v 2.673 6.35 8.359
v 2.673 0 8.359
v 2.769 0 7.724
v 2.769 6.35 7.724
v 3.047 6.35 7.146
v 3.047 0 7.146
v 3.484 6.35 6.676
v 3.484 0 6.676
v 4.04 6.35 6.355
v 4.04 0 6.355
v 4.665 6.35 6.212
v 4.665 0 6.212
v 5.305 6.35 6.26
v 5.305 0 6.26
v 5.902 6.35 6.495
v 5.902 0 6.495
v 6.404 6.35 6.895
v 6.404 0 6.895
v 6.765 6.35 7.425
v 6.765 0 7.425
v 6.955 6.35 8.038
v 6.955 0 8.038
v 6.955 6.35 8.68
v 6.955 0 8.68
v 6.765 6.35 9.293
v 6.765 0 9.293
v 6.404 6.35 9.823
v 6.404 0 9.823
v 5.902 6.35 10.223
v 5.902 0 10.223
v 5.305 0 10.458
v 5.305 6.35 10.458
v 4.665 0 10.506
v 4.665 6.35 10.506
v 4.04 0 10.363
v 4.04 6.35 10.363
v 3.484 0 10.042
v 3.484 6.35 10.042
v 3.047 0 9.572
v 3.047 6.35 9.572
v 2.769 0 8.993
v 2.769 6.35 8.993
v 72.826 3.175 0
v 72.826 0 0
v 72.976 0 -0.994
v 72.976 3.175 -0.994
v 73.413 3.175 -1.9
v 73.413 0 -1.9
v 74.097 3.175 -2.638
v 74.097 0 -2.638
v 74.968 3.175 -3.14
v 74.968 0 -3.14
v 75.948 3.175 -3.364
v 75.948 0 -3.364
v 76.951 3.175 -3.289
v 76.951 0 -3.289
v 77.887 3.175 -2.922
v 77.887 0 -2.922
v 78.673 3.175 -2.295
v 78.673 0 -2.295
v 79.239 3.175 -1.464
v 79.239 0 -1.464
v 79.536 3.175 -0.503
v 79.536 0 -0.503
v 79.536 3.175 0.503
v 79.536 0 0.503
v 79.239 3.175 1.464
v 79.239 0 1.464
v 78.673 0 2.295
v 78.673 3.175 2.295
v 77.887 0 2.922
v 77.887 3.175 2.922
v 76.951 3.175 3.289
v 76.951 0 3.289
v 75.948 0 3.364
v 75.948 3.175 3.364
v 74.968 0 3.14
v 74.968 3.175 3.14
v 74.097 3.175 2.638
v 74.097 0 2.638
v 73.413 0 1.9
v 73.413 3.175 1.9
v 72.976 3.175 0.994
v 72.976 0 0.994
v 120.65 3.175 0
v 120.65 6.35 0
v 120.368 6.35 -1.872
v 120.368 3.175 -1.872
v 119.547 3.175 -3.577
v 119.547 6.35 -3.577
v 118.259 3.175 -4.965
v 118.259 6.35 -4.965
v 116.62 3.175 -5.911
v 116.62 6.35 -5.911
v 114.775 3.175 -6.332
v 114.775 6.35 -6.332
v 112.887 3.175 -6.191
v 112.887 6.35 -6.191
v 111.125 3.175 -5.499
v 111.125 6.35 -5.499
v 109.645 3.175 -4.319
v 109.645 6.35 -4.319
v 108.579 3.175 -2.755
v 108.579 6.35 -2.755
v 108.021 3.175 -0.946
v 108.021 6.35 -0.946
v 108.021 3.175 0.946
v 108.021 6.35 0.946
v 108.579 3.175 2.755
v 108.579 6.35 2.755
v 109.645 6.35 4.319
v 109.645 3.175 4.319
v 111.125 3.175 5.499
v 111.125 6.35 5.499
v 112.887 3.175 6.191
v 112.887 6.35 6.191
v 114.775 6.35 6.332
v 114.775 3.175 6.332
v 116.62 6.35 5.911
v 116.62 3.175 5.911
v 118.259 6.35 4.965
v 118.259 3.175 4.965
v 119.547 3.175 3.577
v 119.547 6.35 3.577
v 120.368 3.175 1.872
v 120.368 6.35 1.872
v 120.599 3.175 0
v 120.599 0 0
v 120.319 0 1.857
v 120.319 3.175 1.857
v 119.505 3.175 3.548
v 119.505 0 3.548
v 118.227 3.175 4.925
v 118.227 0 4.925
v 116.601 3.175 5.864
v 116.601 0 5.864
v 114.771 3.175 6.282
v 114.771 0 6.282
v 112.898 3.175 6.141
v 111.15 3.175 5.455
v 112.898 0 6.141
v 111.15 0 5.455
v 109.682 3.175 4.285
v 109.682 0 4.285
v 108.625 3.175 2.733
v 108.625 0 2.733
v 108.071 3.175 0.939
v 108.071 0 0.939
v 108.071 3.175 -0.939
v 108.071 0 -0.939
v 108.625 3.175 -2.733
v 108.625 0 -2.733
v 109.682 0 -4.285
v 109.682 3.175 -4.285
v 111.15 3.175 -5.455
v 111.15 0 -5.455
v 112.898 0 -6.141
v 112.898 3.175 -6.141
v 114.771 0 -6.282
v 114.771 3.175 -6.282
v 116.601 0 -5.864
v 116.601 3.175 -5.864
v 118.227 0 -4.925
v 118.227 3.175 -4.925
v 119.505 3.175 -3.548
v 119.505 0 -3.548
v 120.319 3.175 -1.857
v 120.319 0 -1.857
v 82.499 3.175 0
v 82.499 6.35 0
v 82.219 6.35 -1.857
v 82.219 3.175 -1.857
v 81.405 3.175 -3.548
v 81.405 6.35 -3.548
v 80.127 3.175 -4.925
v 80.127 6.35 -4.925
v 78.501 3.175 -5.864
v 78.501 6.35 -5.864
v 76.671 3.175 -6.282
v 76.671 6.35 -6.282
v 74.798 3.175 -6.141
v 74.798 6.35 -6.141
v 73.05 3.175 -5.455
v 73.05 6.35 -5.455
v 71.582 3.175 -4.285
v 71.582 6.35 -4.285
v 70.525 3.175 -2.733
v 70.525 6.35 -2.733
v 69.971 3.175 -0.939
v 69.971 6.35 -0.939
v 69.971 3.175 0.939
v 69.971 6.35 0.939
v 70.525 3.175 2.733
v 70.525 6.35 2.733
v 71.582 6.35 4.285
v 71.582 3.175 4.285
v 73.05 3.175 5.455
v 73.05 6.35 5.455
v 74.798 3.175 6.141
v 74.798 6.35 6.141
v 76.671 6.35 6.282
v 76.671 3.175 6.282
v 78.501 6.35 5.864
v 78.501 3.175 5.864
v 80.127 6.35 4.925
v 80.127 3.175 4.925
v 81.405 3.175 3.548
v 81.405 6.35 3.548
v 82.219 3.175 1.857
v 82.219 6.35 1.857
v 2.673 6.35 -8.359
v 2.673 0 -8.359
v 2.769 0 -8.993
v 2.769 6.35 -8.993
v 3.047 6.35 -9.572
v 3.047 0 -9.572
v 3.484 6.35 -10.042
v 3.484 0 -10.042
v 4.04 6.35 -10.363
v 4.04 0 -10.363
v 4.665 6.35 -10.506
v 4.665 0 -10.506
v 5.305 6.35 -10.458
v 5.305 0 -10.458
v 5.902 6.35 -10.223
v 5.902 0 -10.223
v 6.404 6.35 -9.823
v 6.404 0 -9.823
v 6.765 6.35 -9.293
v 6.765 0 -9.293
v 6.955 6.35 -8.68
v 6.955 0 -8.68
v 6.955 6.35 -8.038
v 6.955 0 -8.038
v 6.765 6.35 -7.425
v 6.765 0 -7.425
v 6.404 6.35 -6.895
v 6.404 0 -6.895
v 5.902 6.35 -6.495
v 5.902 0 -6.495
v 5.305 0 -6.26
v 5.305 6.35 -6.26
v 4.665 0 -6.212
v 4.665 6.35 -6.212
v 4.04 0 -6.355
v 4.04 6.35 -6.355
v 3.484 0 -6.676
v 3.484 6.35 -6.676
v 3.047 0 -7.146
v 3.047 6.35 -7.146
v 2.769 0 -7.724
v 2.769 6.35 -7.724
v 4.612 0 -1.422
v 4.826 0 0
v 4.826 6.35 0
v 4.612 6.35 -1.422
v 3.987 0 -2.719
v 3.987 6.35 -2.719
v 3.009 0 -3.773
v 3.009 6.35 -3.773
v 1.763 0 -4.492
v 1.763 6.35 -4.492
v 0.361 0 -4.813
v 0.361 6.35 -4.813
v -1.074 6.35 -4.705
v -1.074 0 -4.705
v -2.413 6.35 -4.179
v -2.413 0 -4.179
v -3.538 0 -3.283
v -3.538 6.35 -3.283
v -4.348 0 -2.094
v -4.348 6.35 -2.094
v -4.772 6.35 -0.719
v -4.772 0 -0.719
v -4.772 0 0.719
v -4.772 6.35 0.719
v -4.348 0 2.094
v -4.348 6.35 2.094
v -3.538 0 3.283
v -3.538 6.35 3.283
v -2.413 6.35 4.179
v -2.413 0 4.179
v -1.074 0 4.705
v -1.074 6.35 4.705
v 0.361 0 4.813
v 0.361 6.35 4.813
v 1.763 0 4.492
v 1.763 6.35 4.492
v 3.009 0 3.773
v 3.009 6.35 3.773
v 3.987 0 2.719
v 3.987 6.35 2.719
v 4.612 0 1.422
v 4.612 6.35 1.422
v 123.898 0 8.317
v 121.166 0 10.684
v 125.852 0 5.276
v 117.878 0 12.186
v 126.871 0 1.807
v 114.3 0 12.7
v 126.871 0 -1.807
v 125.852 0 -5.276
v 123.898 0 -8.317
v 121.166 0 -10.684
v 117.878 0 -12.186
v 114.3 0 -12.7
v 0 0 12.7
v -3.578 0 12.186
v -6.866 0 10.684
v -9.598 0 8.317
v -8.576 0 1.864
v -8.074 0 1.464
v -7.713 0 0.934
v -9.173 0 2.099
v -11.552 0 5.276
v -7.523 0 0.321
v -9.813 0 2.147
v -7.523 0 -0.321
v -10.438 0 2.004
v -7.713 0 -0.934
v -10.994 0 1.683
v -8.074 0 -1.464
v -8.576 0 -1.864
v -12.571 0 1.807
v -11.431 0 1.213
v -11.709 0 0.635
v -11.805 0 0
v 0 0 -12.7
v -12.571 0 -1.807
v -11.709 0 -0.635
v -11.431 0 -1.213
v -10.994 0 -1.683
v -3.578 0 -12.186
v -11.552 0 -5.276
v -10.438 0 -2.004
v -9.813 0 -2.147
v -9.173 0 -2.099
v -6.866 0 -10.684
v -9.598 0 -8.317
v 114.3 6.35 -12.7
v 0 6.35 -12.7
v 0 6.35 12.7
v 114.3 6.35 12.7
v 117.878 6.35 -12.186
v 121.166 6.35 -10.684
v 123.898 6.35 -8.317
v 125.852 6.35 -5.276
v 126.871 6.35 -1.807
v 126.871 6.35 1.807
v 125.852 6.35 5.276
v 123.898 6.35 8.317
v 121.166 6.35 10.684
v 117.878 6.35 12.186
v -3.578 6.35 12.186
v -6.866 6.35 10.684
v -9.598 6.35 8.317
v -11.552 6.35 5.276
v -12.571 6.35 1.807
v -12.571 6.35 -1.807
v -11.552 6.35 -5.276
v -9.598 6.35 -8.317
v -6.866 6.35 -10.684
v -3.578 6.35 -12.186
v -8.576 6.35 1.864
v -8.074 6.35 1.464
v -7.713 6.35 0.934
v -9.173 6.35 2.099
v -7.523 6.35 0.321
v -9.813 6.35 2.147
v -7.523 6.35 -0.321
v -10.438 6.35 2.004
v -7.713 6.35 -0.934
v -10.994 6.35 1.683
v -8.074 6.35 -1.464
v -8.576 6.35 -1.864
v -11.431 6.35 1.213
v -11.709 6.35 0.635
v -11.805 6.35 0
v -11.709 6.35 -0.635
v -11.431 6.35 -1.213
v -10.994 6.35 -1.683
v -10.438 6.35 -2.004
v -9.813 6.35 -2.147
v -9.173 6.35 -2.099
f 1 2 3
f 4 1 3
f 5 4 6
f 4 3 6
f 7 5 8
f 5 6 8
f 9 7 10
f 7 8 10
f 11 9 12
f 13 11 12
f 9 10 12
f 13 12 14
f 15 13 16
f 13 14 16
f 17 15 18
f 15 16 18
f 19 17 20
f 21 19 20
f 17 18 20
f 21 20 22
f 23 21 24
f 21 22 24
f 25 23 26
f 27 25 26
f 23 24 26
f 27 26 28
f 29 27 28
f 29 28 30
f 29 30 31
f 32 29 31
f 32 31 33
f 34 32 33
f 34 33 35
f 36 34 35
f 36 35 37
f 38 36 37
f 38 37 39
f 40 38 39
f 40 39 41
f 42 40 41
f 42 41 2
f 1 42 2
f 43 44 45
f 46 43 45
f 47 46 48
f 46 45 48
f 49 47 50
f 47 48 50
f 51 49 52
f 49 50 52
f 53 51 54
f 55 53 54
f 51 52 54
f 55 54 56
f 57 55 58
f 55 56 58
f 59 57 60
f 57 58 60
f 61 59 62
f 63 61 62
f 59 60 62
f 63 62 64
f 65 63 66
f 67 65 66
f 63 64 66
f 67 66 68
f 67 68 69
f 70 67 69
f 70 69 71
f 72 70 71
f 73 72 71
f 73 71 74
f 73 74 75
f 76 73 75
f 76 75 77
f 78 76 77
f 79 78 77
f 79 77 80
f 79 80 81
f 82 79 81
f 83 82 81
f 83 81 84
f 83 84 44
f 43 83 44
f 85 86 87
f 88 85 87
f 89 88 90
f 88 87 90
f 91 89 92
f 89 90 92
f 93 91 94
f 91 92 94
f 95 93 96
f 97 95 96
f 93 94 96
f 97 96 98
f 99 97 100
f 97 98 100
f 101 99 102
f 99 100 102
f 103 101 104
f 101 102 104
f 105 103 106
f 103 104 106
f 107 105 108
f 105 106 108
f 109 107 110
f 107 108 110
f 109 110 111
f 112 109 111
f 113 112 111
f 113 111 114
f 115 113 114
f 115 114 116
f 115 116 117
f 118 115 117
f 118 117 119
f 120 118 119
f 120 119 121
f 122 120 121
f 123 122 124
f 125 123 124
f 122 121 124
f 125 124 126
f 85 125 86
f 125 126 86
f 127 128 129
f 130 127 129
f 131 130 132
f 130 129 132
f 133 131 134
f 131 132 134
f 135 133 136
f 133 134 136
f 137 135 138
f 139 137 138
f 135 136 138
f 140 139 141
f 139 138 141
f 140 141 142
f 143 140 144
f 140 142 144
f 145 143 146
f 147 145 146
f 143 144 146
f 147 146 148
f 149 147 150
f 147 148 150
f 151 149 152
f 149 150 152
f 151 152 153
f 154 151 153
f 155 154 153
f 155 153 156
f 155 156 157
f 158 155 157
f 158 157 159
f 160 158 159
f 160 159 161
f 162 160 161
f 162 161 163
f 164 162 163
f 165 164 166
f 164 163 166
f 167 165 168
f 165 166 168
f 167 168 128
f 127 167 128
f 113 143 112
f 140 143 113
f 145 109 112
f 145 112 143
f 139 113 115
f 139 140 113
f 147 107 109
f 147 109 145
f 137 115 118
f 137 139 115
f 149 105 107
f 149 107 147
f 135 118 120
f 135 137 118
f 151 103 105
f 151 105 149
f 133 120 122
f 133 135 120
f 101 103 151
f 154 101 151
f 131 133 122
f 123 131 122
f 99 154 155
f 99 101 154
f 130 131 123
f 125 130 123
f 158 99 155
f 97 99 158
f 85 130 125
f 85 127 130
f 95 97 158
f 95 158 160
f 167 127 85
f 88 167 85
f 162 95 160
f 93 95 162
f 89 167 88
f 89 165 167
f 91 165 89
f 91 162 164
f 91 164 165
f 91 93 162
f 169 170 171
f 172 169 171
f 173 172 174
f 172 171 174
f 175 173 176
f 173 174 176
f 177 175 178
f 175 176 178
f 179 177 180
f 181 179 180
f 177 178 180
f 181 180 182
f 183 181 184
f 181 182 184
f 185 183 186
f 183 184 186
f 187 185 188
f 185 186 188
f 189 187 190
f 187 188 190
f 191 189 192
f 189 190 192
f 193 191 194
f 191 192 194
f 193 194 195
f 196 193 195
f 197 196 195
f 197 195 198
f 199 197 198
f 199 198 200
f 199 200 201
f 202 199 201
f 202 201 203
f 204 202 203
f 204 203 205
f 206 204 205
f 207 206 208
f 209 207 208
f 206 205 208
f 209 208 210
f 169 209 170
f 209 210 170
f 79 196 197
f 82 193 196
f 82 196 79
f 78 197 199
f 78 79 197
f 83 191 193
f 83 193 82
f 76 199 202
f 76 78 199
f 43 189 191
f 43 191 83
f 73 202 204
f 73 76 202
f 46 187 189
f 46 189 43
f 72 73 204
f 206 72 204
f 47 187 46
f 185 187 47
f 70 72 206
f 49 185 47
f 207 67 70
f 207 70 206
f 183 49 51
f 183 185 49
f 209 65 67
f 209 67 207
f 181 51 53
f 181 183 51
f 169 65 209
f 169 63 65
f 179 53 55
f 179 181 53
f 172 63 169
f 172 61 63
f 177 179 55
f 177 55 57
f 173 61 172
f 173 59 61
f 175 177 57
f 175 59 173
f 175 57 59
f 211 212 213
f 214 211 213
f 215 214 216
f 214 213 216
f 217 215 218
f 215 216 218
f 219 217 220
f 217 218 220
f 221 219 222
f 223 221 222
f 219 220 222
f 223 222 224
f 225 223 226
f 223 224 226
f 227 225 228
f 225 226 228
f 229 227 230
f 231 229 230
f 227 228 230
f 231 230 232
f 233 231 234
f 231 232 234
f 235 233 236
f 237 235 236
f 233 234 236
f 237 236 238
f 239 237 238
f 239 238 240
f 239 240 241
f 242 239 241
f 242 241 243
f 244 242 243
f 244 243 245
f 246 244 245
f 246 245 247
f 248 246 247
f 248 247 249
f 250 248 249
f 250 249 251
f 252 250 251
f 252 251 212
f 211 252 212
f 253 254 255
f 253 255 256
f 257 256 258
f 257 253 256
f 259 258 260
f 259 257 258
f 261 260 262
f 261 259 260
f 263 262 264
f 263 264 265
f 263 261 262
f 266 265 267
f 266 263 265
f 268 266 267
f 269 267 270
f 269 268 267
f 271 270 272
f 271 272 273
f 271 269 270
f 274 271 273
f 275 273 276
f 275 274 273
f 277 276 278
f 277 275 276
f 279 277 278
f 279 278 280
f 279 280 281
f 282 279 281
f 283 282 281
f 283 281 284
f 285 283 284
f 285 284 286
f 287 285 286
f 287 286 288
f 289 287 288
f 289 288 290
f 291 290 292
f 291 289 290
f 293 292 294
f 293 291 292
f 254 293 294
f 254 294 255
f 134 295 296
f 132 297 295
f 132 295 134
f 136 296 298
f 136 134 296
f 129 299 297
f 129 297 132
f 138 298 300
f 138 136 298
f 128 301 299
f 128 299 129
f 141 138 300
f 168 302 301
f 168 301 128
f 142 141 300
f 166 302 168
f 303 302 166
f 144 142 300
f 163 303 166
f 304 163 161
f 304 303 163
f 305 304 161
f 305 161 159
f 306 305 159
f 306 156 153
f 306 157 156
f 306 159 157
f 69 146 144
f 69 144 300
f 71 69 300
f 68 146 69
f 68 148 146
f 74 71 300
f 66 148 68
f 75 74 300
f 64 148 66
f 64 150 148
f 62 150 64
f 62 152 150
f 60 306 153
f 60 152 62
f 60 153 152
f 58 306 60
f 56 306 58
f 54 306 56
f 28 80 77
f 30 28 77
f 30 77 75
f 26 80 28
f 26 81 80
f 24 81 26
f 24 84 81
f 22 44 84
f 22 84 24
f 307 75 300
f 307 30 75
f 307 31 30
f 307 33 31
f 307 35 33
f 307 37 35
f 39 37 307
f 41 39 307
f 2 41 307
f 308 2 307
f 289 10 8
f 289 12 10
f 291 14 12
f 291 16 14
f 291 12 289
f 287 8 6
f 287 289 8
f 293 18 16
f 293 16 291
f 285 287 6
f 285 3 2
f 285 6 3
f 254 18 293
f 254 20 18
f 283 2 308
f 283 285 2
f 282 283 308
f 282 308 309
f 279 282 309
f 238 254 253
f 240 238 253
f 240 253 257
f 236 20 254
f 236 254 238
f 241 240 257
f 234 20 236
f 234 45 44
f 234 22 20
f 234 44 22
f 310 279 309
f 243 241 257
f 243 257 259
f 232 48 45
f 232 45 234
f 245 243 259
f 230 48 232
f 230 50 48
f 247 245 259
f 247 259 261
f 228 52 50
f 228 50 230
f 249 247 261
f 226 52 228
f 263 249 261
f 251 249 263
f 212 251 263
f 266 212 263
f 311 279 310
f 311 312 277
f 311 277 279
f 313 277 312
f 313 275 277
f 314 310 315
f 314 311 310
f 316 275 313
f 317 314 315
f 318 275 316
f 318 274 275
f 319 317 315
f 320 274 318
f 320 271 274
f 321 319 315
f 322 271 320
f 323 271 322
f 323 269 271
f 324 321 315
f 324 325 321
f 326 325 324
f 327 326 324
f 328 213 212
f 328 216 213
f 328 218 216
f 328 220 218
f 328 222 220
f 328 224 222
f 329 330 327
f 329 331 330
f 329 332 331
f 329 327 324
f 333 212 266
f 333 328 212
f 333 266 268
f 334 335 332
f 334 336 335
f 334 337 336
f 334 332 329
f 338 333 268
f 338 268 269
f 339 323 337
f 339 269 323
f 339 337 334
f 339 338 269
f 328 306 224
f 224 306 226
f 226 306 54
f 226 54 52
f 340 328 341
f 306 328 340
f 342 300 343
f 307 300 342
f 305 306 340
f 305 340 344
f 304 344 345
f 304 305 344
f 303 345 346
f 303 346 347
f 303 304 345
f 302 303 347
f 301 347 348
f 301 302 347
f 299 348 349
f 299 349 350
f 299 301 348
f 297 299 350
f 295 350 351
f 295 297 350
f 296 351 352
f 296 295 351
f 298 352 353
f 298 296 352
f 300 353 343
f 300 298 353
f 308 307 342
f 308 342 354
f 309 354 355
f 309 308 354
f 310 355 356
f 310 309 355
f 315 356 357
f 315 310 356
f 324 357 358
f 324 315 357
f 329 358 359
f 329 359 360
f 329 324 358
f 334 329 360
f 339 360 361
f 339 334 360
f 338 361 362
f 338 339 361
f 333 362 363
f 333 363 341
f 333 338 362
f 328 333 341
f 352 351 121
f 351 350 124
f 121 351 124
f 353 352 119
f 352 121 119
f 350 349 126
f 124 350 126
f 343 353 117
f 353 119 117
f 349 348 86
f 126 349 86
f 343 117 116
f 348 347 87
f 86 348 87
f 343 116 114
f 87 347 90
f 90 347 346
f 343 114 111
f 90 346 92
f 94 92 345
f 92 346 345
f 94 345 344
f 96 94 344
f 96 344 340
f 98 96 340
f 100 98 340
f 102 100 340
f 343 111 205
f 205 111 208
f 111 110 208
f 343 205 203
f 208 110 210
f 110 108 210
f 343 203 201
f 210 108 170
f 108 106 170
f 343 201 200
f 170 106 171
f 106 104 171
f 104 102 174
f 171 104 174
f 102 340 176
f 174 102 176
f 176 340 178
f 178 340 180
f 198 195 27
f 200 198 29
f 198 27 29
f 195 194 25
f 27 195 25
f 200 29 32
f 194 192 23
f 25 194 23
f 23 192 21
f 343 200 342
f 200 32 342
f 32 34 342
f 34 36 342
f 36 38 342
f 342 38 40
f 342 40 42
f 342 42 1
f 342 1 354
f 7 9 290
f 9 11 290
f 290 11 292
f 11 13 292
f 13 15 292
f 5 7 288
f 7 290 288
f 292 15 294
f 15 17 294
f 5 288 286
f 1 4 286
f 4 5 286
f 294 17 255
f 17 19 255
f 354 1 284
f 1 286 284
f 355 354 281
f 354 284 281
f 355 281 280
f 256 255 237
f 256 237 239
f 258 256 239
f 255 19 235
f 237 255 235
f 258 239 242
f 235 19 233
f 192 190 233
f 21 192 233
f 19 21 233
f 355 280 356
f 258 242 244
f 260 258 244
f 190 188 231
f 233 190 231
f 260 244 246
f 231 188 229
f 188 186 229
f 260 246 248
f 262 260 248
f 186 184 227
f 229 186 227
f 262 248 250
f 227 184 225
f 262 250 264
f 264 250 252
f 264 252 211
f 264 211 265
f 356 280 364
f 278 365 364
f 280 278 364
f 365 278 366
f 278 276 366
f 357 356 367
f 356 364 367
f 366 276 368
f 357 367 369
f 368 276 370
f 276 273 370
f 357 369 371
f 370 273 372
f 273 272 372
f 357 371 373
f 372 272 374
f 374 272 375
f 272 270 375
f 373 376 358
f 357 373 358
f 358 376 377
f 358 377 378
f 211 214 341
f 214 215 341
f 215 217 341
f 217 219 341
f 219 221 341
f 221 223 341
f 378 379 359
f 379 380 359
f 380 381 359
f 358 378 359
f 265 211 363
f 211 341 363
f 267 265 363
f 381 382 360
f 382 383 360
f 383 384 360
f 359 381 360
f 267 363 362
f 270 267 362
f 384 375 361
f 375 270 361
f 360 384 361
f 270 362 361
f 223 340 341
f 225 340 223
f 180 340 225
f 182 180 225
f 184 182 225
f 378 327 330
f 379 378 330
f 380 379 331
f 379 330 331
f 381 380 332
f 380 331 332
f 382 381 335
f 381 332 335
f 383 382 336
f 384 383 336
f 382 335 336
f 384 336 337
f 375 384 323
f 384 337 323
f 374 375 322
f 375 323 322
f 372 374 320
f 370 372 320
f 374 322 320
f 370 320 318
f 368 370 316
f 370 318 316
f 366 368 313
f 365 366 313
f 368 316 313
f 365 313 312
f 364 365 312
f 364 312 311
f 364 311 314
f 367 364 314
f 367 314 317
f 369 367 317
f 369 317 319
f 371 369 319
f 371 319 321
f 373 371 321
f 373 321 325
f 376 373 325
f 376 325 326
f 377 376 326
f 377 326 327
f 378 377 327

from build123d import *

# Parameters (mm, degrees)
SKETCH1_R                        = 4.826
BOSS_EXTRUDE1_DEPTH              = 6.35
F_18_0_1695_DIAMETER_HOLE1_D     = 4.3053
F_18_0_1695_DIAMETER_HOLE1_DEPTH = 25.4
F_18_0_1695_DIAMETER_HOLE1_TIP   = 1.293442612
SKETCH4_R                        = 6.2992
SKETCH4_R_2                      = 6.35
CUT_EXTRUDE1_DEPTH               = 3.175
SKETCH5_R                        = 6.2992
CUT_EXTRUDE2_DEPTH               = 3.175
F_17_64_0_26563_DIAMETER_HOLE1_D = 6.747002


with BuildPart() as part:
    # Sketch1 → Boss-Extrude1 (new body)
    with BuildSketch(Plane(origin=(0, 0, 0), x_dir=(1, 0, 0), z_dir=(0, 1, 0))):
        with BuildLine():
            Line((0, 12.7), (114.3, 12.7))
            ThreePointArc((114.3, 12.7), (127, 0), (114.3, -12.7))
            Line((114.3, -12.7), (0, -12.7))
            ThreePointArc((0, -12.7), (-12.7, 0), (0, 12.7))
        make_face()
        Circle(SKETCH1_R, mode=Mode.SUBTRACT)
    extrude(amount=BOSS_EXTRUDE1_DEPTH)

    # #18 (0.1695) Diameter Hole1
    with Locations(Plane(origin=(0, 6.35, 0), x_dir=(1, 0, 0), z_dir=(0, 1, 0))):
        with Locations((-9.652, 0), (4.826, 8.358877197), (4.826, -8.358877197)):
            Hole(F_18_0_1695_DIAMETER_HOLE1_D / 2, depth=F_18_0_1695_DIAMETER_HOLE1_DEPTH)
            with Locations((0, 0, -(F_18_0_1695_DIAMETER_HOLE1_DEPTH + F_18_0_1695_DIAMETER_HOLE1_TIP / 2))):  # 118° drill point
                Cone(0, F_18_0_1695_DIAMETER_HOLE1_D / 2, F_18_0_1695_DIAMETER_HOLE1_TIP, mode=Mode.SUBTRACT)

    # Sketch4 → Cut-Extrude1 (cut)
    with BuildSketch(Plane(origin=(0, 6.35, 0), x_dir=(1, 0, 0), z_dir=(0, 1, 0))):
        with Locations((76.2, 0)):
            Circle(SKETCH4_R)
        with Locations((114.3, 0)):
            Circle(SKETCH4_R_2)
    extrude(amount=-CUT_EXTRUDE1_DEPTH, mode=Mode.SUBTRACT)

    # Sketch5 → Cut-Extrude2 (cut)
    with BuildSketch(Plane.XZ):
        with Locations((114.3, 0)):
            Circle(SKETCH5_R)
    extrude(amount=-CUT_EXTRUDE2_DEPTH, mode=Mode.SUBTRACT)

    # 17/64 (0.26563) Diameter Hole1 (through all)
    with Locations(Plane(origin=(0, 6.35, 0), x_dir=(1, 0, 0), z_dir=(0, 1, 0))):
        with Locations((76.2, 0), (114.3, 0)):
            Hole(F_17_64_0_26563_DIAMETER_HOLE1_D / 2)


solid = part.part
